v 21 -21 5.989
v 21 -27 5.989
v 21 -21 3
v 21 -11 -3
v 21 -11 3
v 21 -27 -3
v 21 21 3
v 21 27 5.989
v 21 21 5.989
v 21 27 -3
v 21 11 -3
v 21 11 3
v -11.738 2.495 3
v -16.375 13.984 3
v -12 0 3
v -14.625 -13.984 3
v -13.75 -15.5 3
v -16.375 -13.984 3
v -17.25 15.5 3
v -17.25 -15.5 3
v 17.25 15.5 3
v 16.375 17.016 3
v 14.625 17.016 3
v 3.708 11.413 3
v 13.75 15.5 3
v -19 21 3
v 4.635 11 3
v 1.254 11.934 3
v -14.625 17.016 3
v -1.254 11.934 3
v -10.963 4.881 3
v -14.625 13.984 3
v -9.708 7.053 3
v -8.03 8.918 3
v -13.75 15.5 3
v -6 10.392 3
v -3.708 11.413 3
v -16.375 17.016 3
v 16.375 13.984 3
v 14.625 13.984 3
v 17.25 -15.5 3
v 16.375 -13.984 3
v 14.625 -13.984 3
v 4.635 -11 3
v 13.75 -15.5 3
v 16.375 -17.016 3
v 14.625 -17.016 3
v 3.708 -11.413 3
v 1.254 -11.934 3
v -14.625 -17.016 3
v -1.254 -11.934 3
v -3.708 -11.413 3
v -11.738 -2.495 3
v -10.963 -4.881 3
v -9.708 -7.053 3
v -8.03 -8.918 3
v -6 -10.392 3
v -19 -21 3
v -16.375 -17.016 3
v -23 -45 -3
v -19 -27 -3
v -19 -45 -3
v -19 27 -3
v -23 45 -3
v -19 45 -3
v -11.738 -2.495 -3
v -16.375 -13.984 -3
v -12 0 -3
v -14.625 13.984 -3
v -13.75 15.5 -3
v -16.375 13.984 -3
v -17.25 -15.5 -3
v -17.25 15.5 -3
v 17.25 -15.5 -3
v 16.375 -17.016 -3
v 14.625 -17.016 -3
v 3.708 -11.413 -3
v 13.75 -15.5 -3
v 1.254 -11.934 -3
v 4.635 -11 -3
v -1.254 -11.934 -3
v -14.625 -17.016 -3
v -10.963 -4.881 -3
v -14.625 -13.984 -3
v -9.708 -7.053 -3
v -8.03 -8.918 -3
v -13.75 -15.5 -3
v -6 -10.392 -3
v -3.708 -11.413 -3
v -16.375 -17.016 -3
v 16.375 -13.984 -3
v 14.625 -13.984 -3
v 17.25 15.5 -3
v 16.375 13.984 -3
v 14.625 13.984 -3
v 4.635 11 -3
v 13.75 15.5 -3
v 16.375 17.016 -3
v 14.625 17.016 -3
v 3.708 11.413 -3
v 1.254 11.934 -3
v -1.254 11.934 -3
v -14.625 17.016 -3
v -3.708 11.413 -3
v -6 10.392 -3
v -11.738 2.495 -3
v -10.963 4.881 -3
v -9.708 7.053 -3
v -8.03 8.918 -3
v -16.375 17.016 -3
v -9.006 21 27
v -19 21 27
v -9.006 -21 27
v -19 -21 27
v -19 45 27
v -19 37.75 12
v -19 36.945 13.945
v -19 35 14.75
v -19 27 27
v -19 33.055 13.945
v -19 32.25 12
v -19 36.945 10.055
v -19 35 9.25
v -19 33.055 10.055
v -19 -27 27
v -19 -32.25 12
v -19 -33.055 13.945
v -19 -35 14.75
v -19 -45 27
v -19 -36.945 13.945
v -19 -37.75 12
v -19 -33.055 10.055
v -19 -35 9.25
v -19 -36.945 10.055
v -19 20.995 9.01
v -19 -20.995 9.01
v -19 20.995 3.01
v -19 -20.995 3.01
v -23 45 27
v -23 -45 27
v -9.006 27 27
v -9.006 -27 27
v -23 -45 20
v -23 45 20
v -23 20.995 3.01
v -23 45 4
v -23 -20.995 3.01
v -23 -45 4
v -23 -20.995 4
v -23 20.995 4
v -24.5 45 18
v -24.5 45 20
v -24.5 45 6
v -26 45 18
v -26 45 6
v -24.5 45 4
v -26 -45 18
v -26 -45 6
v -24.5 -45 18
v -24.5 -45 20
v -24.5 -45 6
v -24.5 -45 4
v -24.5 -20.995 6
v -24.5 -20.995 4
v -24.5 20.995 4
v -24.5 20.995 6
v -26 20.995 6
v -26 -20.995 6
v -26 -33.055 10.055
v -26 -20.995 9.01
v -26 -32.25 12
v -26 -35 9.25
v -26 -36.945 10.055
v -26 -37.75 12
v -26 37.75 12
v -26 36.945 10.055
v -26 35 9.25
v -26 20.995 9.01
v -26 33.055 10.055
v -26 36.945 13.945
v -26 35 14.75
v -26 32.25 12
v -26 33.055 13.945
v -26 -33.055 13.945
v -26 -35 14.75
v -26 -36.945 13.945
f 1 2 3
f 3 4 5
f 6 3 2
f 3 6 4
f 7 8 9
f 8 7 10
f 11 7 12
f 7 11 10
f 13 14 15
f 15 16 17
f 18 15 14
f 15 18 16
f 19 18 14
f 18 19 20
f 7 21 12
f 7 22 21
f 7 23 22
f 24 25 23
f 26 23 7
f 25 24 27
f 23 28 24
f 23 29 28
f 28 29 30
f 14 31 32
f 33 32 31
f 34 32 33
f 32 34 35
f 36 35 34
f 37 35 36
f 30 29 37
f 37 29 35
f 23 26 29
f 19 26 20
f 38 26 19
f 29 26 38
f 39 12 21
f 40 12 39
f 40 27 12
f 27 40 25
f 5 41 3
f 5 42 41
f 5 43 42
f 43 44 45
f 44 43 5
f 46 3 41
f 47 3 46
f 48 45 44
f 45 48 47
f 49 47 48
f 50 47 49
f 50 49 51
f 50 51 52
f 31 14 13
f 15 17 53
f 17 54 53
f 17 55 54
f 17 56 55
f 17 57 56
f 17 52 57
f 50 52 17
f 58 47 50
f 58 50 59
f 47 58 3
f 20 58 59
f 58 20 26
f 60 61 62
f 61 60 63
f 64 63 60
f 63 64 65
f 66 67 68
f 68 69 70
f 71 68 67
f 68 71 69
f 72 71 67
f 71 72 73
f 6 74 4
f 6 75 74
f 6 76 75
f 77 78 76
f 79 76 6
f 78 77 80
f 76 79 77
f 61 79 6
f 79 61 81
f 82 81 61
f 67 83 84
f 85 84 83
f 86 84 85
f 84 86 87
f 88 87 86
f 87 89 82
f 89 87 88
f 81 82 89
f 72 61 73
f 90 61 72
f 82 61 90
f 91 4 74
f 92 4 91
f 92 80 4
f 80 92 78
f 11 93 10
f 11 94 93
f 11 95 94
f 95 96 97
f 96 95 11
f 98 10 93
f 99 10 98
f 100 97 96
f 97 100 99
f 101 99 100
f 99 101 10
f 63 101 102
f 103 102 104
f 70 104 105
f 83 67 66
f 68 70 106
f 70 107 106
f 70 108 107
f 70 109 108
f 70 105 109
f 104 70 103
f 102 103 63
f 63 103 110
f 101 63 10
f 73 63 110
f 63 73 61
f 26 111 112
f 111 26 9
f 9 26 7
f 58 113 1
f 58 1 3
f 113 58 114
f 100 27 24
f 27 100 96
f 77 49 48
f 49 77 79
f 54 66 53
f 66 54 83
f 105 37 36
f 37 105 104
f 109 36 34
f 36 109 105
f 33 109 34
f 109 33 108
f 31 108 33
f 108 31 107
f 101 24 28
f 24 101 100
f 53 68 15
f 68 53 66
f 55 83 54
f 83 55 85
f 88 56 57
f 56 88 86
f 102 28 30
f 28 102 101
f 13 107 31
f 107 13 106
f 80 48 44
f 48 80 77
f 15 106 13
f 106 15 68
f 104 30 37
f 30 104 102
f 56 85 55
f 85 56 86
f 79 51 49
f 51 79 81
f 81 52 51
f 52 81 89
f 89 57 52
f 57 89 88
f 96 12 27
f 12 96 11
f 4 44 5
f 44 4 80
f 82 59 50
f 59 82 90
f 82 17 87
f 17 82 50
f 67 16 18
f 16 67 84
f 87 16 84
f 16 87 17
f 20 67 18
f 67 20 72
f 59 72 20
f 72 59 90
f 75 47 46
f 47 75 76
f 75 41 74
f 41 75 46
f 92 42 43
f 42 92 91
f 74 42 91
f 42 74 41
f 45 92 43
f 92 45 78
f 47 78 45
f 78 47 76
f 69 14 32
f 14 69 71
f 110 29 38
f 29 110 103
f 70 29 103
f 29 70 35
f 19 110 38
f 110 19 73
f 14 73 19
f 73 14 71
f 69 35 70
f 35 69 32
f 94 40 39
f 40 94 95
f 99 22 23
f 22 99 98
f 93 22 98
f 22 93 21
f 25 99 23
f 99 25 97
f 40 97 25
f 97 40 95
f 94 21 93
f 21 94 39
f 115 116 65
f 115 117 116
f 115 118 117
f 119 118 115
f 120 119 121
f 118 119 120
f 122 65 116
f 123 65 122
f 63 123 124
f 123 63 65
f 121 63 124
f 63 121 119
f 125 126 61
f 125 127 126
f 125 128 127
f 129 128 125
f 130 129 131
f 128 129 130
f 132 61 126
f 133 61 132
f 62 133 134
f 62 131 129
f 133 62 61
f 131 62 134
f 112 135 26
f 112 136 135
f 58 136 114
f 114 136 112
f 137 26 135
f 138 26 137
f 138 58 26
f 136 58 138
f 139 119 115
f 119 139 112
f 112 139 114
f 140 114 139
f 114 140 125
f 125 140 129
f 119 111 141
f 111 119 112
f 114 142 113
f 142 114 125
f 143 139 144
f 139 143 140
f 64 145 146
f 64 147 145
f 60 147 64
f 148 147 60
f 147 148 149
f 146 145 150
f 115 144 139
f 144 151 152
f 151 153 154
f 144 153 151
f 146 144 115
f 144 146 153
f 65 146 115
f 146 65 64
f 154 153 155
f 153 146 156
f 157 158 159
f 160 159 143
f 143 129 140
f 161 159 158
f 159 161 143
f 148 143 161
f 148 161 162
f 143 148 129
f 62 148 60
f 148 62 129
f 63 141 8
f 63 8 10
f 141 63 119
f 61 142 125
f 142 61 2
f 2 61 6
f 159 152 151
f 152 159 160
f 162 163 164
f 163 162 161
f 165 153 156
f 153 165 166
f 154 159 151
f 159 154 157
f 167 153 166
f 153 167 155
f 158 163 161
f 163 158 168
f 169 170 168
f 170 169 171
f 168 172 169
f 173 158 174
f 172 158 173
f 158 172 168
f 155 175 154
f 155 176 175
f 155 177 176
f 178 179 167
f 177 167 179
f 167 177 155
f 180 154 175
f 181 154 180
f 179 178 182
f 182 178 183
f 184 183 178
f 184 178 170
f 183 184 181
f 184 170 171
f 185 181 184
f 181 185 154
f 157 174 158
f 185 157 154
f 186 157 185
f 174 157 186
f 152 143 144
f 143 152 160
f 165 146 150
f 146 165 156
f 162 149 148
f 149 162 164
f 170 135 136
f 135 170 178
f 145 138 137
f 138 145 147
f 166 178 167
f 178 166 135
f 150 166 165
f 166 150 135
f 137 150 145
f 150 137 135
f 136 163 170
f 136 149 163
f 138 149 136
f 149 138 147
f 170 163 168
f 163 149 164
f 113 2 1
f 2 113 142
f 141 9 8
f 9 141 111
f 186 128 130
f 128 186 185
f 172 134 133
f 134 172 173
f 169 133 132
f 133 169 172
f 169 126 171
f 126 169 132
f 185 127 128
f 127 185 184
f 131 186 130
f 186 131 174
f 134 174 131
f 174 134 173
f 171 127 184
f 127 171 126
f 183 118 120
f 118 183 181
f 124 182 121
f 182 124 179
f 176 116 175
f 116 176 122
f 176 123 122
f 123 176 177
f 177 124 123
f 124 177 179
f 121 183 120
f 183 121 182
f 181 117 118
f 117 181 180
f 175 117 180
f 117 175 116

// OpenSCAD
// file: includes/nema_mount.scad
module nema_mount() {
    difference(){
        cube([42,42,6],center=true);
        cylinder(d=24,h=7,center=true);
        translate([12,0,0])cube([24,22,7],center=true);
        translate([-31/2,-31/2,0])cylinder(d=3.5,h=7,center=true);
        translate([31/2,-31/2,0])cylinder(d=3.5,h=7,center=true);
        translate([-31/2,31/2,0])cylinder(d=3.5,h=7,center=true);
        translate([31/2,31/2,0])cylinder(d=3.5,h=7,center=true);
    }
}

//nema_mount();
// file: includes/config.scad
x = 27.35;
y = 45;
block_bolt_size = 4;
block_bolt_head = 9;
z_nut = 13;
z_rod = 8;
z_motor_bolt = 5.5;

clearance = 0.25;
// main file
include <includes/config.scad>
include <includes/nema_mount.scad>

//support sides should be polyhedron but this'll do for now

difference(){
    union(){
        nema_mount(); //obvious
        translate([-21,0,15-3])cube([4,90,30],center=true); // vertical for mounting to frame
        translate([0,21+3,15-3])cube([42,6,30],center=true); //support sides
        translate([0,-21-3,15-3])cube([42,6,30],center=true); //support sides
        translate([-21-2-1.5-0.75,0,15-3])cube([1.5,90,12],center=true); //this bit
        translate([-21-2-0.75,0,15-3])cube([1.5,90,16],center=true); //and this bit are to sit into the frame
    }
    translate([-20,0,6.01])cube([42,41.99,6],center=true);
    translate([7,0,28])rotate([0,35,0])cube([50,70,20],center=true);
    translate([-23,-35,15-3])rotate([0,90,0])cylinder(d=z_motor_bolt,h=15,center=true,$fn=8);
    translate([-23,35,15-3])rotate([0,90,0])cylinder(d=z_motor_bolt,h=15,center=true,$fn=8);
}
